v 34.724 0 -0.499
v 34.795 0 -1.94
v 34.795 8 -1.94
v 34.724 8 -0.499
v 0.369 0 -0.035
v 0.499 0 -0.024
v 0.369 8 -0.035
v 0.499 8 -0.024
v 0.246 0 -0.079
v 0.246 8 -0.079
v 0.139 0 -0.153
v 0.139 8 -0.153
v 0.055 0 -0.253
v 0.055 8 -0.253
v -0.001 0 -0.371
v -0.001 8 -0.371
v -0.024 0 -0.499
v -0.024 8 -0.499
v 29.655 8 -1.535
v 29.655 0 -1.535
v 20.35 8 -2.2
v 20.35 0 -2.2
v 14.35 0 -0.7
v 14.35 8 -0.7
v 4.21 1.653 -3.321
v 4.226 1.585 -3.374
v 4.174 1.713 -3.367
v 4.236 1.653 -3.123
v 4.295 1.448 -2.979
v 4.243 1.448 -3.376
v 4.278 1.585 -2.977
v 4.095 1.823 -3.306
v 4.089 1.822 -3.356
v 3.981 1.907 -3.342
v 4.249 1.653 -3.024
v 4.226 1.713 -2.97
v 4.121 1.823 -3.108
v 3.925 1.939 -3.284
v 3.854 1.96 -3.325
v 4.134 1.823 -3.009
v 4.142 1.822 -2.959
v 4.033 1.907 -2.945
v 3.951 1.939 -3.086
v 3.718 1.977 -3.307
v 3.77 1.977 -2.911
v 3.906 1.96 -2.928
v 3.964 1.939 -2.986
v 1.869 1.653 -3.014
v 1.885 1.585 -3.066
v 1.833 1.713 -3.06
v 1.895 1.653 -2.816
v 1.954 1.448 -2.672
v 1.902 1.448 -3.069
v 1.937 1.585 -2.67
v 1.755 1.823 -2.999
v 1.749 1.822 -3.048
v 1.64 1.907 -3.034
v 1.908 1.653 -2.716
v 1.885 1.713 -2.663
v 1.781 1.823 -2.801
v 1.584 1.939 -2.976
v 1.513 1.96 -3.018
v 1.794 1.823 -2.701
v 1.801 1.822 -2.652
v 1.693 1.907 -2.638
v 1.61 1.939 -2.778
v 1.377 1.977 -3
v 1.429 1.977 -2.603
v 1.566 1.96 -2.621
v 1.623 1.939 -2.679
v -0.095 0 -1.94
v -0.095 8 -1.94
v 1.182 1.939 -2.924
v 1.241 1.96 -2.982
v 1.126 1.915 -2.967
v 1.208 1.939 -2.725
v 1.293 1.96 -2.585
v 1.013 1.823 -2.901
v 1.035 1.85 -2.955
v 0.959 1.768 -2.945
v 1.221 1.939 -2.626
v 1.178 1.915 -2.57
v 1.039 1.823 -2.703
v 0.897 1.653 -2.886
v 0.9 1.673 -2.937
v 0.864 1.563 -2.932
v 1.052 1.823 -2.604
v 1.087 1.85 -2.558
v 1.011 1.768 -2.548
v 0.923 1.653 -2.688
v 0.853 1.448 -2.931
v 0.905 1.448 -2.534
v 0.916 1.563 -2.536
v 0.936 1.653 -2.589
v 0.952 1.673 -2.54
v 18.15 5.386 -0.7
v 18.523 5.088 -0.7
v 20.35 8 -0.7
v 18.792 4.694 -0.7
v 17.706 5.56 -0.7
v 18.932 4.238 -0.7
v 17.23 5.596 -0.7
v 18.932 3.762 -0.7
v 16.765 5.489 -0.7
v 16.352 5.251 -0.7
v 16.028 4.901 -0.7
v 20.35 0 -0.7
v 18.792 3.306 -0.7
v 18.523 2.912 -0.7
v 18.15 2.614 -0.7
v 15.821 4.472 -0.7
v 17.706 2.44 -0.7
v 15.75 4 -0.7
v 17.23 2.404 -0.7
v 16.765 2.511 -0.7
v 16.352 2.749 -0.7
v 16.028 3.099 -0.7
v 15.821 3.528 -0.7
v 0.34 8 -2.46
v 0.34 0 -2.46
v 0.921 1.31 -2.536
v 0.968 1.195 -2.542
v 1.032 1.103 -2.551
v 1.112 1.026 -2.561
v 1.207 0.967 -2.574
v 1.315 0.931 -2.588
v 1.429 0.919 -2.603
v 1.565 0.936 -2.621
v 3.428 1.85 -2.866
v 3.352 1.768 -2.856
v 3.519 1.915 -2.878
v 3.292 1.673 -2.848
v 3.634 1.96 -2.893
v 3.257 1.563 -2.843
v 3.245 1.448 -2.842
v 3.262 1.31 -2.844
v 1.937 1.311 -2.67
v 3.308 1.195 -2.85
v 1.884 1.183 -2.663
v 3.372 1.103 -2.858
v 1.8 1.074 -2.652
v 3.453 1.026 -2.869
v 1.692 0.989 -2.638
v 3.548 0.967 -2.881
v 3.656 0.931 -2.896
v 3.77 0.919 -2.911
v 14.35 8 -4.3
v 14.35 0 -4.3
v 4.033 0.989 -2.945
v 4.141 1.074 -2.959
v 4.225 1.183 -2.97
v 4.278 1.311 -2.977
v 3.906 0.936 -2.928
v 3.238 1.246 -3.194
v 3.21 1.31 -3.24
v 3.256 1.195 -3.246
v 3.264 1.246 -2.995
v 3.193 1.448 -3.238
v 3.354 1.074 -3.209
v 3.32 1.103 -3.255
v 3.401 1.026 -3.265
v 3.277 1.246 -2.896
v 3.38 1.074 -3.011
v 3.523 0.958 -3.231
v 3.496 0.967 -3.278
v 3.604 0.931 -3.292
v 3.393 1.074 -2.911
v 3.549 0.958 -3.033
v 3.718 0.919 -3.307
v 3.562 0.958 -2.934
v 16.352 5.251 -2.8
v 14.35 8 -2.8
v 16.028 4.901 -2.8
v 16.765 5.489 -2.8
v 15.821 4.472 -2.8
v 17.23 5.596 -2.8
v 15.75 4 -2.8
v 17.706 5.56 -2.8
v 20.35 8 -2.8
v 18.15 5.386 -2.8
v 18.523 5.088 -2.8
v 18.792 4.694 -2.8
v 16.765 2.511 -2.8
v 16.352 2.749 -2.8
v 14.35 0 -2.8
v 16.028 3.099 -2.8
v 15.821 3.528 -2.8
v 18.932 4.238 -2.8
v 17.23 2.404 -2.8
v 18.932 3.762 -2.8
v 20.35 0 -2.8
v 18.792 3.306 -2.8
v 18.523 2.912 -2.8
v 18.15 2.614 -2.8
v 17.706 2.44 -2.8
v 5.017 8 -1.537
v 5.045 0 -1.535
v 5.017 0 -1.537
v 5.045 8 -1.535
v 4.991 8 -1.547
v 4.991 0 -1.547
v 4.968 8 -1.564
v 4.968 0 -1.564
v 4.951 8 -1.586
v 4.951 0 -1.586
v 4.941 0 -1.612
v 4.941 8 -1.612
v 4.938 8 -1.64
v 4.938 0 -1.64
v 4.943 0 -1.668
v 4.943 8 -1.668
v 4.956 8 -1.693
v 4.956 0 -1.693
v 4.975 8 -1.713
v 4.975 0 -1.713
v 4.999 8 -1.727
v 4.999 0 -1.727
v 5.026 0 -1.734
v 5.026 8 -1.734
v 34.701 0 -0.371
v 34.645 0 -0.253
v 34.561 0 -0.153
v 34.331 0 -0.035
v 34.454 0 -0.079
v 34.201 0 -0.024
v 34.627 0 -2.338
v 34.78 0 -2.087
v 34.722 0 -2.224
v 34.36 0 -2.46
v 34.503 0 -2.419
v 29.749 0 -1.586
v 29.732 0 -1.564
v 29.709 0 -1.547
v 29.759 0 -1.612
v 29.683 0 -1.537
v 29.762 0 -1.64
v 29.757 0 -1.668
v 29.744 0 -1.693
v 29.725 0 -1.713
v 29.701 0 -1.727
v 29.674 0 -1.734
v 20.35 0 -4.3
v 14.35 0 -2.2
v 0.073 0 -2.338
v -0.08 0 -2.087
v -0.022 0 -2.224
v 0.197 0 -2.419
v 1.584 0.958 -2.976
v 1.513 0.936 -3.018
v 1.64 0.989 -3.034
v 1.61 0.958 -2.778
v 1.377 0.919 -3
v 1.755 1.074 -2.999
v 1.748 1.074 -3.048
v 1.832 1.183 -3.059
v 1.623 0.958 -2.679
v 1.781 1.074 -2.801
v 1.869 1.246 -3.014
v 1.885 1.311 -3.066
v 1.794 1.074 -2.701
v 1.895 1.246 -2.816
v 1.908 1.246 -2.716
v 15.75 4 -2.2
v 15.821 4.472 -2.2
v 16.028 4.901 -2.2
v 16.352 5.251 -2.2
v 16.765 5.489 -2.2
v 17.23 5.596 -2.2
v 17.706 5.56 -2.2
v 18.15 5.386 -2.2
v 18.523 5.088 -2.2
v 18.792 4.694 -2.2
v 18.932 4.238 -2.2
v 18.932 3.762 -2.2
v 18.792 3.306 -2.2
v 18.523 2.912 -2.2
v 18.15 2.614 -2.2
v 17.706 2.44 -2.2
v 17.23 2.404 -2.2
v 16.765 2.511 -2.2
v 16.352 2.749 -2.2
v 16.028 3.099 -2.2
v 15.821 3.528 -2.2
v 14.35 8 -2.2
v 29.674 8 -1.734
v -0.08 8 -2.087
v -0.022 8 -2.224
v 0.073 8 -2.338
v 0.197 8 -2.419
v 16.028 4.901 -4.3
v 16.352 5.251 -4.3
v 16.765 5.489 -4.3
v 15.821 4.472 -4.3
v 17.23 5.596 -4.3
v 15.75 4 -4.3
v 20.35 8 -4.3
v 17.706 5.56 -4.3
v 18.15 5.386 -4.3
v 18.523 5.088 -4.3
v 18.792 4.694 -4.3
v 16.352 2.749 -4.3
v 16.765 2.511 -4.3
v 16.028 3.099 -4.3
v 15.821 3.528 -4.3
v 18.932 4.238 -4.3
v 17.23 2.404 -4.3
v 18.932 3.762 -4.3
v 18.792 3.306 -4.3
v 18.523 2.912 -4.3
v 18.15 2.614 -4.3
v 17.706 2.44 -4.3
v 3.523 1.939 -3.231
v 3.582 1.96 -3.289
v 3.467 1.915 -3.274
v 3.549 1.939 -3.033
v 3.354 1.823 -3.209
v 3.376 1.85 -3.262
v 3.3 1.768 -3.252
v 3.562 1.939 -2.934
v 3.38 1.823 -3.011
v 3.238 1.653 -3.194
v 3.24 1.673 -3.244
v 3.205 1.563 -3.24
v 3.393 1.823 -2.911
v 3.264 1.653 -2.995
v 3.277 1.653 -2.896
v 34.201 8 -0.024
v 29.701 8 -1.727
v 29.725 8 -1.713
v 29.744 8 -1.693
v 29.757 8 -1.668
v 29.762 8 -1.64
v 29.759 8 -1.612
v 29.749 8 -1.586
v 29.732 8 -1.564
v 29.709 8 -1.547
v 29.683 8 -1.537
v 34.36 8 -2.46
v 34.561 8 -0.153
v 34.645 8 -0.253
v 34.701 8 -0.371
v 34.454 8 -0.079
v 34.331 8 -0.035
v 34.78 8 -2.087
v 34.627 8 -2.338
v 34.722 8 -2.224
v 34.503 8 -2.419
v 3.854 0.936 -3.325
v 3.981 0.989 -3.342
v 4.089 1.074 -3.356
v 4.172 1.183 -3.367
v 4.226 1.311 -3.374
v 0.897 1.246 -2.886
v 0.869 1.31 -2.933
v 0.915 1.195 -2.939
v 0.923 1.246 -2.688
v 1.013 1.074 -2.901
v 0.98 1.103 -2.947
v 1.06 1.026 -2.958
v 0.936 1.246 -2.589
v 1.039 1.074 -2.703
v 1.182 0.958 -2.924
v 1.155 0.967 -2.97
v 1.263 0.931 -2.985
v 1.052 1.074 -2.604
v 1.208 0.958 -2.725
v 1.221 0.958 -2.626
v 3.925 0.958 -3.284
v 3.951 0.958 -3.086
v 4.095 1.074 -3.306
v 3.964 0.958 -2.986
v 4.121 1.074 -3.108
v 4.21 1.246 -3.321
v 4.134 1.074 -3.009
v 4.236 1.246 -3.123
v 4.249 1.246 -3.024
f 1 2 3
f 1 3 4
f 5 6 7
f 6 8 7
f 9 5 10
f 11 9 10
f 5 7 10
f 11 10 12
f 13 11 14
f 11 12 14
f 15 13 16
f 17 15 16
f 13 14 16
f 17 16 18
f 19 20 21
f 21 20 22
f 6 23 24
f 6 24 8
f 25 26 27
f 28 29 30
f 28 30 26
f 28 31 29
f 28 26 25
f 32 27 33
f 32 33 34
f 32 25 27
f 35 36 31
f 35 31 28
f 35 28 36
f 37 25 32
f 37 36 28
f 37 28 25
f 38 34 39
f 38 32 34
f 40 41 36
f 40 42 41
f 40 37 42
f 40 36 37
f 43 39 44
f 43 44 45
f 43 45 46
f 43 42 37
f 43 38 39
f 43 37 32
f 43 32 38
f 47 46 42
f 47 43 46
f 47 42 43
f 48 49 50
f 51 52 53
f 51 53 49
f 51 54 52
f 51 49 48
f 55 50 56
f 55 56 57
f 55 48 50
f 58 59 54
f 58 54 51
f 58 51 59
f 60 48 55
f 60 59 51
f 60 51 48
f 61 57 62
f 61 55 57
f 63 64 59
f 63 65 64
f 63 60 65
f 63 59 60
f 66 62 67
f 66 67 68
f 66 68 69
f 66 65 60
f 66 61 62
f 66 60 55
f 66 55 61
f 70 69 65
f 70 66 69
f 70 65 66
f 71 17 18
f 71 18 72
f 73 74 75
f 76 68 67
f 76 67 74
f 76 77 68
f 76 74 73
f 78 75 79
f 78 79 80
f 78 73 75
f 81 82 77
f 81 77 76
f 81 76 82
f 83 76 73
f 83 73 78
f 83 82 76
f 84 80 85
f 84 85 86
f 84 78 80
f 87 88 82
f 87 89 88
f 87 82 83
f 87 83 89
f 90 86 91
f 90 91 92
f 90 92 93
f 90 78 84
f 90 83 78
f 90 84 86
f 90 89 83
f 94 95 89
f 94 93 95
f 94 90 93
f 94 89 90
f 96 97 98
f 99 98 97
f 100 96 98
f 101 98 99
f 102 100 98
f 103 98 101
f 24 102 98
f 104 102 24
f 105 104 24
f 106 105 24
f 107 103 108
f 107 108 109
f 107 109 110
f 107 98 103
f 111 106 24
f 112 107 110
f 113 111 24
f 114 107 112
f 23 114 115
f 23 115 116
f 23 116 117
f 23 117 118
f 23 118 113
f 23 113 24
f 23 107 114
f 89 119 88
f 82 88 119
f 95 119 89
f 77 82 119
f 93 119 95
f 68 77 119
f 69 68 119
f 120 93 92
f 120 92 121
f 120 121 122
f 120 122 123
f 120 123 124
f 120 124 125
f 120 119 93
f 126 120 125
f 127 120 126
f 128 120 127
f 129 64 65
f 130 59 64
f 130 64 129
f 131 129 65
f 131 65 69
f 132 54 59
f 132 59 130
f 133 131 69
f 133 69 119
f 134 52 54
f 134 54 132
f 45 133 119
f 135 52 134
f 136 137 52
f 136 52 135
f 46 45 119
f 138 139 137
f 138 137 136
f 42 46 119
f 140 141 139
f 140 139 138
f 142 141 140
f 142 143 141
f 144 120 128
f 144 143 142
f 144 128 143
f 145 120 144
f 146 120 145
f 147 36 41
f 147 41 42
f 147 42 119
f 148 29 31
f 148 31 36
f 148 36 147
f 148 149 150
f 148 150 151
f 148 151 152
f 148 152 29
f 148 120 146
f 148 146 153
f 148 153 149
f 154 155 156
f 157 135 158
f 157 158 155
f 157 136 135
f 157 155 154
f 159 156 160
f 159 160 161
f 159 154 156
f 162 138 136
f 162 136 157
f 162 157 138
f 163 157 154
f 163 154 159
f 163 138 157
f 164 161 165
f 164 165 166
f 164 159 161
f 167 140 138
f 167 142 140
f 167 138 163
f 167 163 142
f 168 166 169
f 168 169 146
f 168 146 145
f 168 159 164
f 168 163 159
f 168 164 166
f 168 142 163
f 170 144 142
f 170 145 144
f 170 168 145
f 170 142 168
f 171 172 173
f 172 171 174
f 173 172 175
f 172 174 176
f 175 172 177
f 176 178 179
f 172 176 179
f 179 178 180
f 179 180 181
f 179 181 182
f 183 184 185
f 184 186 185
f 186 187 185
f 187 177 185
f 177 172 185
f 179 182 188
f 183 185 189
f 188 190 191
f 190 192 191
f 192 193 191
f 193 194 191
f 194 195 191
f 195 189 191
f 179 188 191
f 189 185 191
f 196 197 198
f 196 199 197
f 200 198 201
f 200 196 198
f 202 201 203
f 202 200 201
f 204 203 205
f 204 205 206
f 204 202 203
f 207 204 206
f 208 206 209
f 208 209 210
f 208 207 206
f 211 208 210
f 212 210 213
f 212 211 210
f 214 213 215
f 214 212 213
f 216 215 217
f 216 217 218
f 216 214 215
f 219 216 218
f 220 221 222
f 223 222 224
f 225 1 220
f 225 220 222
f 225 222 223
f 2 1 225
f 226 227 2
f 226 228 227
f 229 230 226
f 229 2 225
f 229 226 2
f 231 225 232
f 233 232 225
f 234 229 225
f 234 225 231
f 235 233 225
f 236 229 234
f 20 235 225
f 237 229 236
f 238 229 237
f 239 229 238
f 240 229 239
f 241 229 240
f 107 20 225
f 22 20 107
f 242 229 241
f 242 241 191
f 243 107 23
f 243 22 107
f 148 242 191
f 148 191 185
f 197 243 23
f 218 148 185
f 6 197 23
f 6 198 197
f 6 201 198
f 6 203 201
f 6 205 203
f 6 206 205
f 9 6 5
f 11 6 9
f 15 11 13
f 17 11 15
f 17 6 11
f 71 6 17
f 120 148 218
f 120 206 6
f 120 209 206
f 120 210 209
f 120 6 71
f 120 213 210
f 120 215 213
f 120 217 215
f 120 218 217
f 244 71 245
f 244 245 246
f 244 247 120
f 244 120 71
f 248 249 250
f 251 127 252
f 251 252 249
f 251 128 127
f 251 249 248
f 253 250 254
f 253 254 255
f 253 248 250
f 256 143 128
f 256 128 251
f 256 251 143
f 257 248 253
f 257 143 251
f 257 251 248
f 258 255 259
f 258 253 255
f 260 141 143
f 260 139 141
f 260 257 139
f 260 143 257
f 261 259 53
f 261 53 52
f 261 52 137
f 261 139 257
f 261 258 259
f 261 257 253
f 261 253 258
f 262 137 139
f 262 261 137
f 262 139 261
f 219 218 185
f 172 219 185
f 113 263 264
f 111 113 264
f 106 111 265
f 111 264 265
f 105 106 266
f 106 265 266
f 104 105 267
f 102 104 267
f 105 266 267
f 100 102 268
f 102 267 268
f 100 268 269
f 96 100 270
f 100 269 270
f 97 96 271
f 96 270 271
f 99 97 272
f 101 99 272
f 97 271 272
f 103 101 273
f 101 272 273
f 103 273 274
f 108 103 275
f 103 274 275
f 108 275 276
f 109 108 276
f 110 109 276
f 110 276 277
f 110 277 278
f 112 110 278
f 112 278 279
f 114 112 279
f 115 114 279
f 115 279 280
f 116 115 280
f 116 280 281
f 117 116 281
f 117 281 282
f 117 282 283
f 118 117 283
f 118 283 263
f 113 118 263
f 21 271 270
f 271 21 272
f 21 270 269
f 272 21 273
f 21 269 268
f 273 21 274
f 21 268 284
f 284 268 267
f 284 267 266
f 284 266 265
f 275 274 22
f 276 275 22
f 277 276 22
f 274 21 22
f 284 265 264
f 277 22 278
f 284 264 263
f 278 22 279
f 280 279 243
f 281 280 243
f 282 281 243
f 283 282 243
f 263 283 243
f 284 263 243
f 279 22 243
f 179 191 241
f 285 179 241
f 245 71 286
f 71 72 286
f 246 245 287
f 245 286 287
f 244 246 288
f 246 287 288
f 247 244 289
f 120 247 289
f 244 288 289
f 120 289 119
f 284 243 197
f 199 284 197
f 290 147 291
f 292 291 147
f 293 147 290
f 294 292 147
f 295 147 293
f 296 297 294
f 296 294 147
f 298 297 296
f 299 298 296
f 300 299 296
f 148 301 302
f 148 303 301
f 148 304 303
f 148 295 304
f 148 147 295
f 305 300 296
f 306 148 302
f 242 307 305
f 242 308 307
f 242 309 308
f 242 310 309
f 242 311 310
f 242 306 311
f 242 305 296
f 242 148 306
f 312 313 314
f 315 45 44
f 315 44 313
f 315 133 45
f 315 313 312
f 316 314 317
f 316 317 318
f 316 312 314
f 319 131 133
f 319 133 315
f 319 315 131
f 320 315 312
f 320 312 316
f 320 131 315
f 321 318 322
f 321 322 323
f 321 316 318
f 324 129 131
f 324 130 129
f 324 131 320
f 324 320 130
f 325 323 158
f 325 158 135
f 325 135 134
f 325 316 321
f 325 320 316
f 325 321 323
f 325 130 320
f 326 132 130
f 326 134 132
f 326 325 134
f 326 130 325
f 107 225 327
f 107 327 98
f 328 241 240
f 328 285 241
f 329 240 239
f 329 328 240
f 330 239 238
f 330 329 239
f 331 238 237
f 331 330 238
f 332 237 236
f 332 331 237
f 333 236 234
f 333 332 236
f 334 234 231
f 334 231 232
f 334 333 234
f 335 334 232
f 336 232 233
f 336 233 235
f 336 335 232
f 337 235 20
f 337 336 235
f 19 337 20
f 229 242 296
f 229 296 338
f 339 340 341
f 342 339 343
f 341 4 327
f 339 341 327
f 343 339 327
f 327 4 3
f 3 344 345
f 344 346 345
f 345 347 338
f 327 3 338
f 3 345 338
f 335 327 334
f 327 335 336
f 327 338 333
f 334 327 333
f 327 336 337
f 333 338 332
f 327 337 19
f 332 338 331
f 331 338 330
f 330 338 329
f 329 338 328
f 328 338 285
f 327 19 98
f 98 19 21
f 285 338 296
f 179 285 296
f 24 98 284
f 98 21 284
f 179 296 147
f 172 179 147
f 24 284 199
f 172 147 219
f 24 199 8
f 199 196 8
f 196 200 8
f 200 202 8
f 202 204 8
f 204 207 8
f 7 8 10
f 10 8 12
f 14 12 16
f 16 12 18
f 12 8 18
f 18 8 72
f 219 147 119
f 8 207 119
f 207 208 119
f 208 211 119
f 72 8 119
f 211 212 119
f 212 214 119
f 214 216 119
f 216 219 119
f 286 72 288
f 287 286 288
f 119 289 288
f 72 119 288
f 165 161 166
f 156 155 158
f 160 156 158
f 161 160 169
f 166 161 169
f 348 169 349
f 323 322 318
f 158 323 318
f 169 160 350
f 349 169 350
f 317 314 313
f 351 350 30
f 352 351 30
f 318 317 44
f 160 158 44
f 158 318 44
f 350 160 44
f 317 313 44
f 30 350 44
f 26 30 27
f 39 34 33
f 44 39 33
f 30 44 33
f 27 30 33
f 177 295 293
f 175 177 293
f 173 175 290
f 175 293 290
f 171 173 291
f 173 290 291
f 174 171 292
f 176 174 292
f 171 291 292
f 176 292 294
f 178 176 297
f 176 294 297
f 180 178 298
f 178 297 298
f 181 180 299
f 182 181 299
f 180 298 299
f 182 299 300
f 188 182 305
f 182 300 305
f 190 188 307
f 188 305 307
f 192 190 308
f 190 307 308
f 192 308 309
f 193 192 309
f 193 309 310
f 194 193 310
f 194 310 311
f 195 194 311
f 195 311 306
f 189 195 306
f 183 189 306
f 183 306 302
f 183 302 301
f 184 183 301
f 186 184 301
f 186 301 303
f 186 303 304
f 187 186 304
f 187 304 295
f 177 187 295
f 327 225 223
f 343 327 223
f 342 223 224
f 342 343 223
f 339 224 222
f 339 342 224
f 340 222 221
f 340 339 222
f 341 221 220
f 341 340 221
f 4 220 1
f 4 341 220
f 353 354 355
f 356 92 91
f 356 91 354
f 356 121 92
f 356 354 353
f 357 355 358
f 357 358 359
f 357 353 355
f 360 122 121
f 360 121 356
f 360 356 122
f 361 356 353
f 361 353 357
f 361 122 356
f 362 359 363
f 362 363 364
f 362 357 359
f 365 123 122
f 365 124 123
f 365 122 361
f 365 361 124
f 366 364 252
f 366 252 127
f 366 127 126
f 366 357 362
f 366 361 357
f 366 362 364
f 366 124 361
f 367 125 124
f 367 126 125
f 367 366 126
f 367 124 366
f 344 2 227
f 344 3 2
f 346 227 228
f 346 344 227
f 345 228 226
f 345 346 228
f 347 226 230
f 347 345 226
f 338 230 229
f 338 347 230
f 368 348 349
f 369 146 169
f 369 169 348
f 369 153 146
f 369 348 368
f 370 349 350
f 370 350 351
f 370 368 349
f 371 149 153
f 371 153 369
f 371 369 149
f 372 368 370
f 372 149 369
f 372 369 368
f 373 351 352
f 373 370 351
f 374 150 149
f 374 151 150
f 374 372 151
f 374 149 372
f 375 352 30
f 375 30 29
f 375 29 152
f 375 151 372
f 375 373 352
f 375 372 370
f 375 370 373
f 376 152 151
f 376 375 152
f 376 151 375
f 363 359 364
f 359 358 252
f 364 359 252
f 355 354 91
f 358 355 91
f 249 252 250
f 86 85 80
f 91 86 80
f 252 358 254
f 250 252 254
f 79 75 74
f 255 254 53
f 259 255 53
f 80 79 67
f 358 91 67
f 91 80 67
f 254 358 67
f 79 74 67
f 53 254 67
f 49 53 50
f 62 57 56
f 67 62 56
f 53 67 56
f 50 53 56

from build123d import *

# Parameters (mm, degrees)
BOSS_EXTRUDE1_DEPTH       = 8
FILLET1_R                 = 0.1
FILLET2_R                 = 0.5
SKETCH2_R                 = 1.6
CUT_EXTRUDE1_DEPTH        = 36.95822091
REVISION_INDICATION_DEPTH = 0.4


with BuildPart() as part:
    # Sketch1 → Boss-Extrude1 (new body)
    with BuildSketch(Plane(origin=(0, 0, 0), x_dir=(1, 0, 0), z_dir=(0, 1, 0))):
        Polygon((20.35, 0.7), (14.35, 0.7), (0, 0), (-0.117073171, 2.4), (14.35, 4.3), (20.35, 4.3), (34.817073171, 2.4), (34.7, 0), align=None)
        Polygon((20.35, 2.2), (14.35, 2.2), (0.35, 1.2), (14.35, 2.8), (20.35, 2.8), (34.35, 1.2), align=None, mode=Mode.SUBTRACT)
    extrude(amount=BOSS_EXTRUDE1_DEPTH)

    # Fillet1
    fillet1_edges = [part.edges().sort_by_distance(p)[0] for p in [
        (0.35, 4, -1.2),
        (34.35, 4, -1.2),
    ]]
    fillet(fillet1_edges, radius=FILLET1_R)

    # Fillet2
    fillet2_edges = [part.edges().sort_by_distance(p)[0] for p in [
        (-0.117073171, 4, -2.4),
        (34.817073171, 4, -2.4),
        (34.7, 4, 0),
        (0, 4, 0),
    ]]
    fillet(fillet2_edges, radius=FILLET2_R)

    # Sketch2 → Cut-Extrude1 (cut, through all)
    with BuildSketch(Plane(origin=(0, 0, -4.3), x_dir=(-1, 0, 0), z_dir=(0, 0, -1))):
        with Locations((-17.35, 4)):
            Circle(SKETCH2_R)
    extrude(amount=-CUT_EXTRUDE1_DEPTH, mode=Mode.SUBTRACT)

    # Sketch5 → revision indication (add)
    with BuildSketch(Plane(origin=(-0.311839138, 0, -2.374420857), x_dir=(-0.9914858429395939, 0, 0.13021452780071538), z_dir=(-0.13021452780071538, 0, -0.9914858429395939))):
        with BuildLine():
            add(Edge.make_bspline(
                [(-1.75614285, 1.976923077), (-1.720782037, 1.974821832), (-1.651461296, 1.970702586), (-1.551241734, 1.942442049), (-1.460537137, 1.892261337), (-1.379742922, 1.825381725), (-1.313146886, 1.744291021), (-1.261177847, 1.654309873), (-1.233163488, 1.553251269), (-1.229074248, 1.483528859), (-1.226976184, 1.44775641)],
                knots=[0, 0, 0, 0, 1.020151414, 1.999887582, 2.974338812, 3.990962822, 5.007586832, 5.987933904, 6.967670073, 8, 8, 8, 8], degree=3))
            add(Edge.make_bspline(
                [(-1.226976184, 1.44775641), (-1.229145345, 1.412843512), (-1.233422899, 1.343995789), (-1.261113631, 1.243699421), (-1.313542951, 1.153662038), (-1.379283581, 1.071471016), (-1.46055711, 1.004449722), (-1.551456175, 0.954695939), (-1.651226029, 0.924411918), (-1.720742787, 0.920554208), (-1.75614285, 0.918589744)],
                knots=[0, 0, 0, 0, 1.009421747, 1.99056486, 2.972319754, 3.999869655, 5.017953583, 5.993804169, 6.978383603, 8, 8, 8, 8], degree=3))
            add(Edge.make_bspline(
                [(-1.75614285, 0.918589744), (-1.791568422, 0.920483127), (-1.860728417, 0.924179507), (-1.960125864, 0.955317742), (-2.051578507, 1.003983162), (-2.132836213, 1.071595984), (-2.19912744, 1.153239101), (-2.249247777, 1.244319503), (-2.279347047, 1.343708683), (-2.283305588, 1.412786963), (-2.285309517, 1.44775641)],
                knots=[0, 0, 0, 0, 1.022052826, 1.995314843, 2.982371812, 4.00089066, 5.028879526, 6.005146991, 6.990147033, 8, 8, 8, 8], degree=3))
            add(Edge.make_bspline(
                [(-2.285309517, 1.44775641), (-2.283382565, 1.483587428), (-2.279620429, 1.553543092), (-2.249184588, 1.653690044), (-2.199516318, 1.744709926), (-2.132377959, 1.825258007), (-2.051598165, 1.892726399), (-1.960346478, 1.941829667), (-1.860489026, 1.970931558), (-1.791528138, 1.974891267), (-1.75614285, 1.976923077)],
                knots=[0, 0, 0, 0, 1.032775665, 2.016367738, 2.991239715, 4.008302682, 5.025365648, 6.011011707, 6.979408107, 8, 8, 8, 8], degree=3))
        make_face()
        with BuildLine():
            add(Edge.make_bspline(
                [(-4.117040286, 1.976923077), (-4.081679473, 1.974821832), (-4.012358732, 1.970702586), (-3.91213917, 1.942442049), (-3.821434573, 1.892261337), (-3.740640358, 1.825381725), (-3.674044322, 1.744291021), (-3.622075283, 1.654309873), (-3.594060924, 1.553251269), (-3.589971684, 1.483528859), (-3.587873619, 1.44775641)],
                knots=[0, 0, 0, 0, 1.020151414, 1.999887582, 2.974338812, 3.990962822, 5.007586832, 5.987933904, 6.967670073, 8, 8, 8, 8], degree=3))
            add(Edge.make_bspline(
                [(-3.587873619, 1.44775641), (-3.590042781, 1.412843512), (-3.594320335, 1.343995789), (-3.622011067, 1.243699421), (-3.674440387, 1.153662038), (-3.740181017, 1.071471016), (-3.821454546, 1.004449722), (-3.91235361, 0.954695939), (-4.012123464, 0.924411918), (-4.081640223, 0.920554208), (-4.117040286, 0.918589744)],
                knots=[0, 0, 0, 0, 1.009421747, 1.99056486, 2.972319754, 3.999869655, 5.017953583, 5.993804169, 6.978383603, 8, 8, 8, 8], degree=3))
            add(Edge.make_bspline(
                [(-4.117040286, 0.918589744), (-4.152465858, 0.920483127), (-4.221625853, 0.924179507), (-4.3210233, 0.955317742), (-4.412475943, 1.003983162), (-4.493733649, 1.071595984), (-4.560024876, 1.153239101), (-4.610145213, 1.244319503), (-4.640244483, 1.343708683), (-4.644203024, 1.412786963), (-4.646206953, 1.44775641)],
                knots=[0, 0, 0, 0, 1.022052826, 1.995314843, 2.982371812, 4.00089066, 5.028879526, 6.005146991, 6.990147033, 8, 8, 8, 8], degree=3))
            add(Edge.make_bspline(
                [(-4.646206953, 1.44775641), (-4.644280001, 1.483587428), (-4.640517865, 1.553543092), (-4.610082024, 1.653690044), (-4.560413754, 1.744709926), (-4.493275395, 1.825258007), (-4.412495601, 1.892726399), (-4.321243914, 1.941829667), (-4.221386462, 1.970931558), (-4.152425574, 1.974891267), (-4.117040286, 1.976923077)],
                knots=[0, 0, 0, 0, 1.032775665, 2.016367738, 2.991239715, 4.008302682, 5.025365648, 6.011011707, 6.979408107, 8, 8, 8, 8], degree=3))
        make_face()
    extrude(amount=REVISION_INDICATION_DEPTH)


solid = part.part
